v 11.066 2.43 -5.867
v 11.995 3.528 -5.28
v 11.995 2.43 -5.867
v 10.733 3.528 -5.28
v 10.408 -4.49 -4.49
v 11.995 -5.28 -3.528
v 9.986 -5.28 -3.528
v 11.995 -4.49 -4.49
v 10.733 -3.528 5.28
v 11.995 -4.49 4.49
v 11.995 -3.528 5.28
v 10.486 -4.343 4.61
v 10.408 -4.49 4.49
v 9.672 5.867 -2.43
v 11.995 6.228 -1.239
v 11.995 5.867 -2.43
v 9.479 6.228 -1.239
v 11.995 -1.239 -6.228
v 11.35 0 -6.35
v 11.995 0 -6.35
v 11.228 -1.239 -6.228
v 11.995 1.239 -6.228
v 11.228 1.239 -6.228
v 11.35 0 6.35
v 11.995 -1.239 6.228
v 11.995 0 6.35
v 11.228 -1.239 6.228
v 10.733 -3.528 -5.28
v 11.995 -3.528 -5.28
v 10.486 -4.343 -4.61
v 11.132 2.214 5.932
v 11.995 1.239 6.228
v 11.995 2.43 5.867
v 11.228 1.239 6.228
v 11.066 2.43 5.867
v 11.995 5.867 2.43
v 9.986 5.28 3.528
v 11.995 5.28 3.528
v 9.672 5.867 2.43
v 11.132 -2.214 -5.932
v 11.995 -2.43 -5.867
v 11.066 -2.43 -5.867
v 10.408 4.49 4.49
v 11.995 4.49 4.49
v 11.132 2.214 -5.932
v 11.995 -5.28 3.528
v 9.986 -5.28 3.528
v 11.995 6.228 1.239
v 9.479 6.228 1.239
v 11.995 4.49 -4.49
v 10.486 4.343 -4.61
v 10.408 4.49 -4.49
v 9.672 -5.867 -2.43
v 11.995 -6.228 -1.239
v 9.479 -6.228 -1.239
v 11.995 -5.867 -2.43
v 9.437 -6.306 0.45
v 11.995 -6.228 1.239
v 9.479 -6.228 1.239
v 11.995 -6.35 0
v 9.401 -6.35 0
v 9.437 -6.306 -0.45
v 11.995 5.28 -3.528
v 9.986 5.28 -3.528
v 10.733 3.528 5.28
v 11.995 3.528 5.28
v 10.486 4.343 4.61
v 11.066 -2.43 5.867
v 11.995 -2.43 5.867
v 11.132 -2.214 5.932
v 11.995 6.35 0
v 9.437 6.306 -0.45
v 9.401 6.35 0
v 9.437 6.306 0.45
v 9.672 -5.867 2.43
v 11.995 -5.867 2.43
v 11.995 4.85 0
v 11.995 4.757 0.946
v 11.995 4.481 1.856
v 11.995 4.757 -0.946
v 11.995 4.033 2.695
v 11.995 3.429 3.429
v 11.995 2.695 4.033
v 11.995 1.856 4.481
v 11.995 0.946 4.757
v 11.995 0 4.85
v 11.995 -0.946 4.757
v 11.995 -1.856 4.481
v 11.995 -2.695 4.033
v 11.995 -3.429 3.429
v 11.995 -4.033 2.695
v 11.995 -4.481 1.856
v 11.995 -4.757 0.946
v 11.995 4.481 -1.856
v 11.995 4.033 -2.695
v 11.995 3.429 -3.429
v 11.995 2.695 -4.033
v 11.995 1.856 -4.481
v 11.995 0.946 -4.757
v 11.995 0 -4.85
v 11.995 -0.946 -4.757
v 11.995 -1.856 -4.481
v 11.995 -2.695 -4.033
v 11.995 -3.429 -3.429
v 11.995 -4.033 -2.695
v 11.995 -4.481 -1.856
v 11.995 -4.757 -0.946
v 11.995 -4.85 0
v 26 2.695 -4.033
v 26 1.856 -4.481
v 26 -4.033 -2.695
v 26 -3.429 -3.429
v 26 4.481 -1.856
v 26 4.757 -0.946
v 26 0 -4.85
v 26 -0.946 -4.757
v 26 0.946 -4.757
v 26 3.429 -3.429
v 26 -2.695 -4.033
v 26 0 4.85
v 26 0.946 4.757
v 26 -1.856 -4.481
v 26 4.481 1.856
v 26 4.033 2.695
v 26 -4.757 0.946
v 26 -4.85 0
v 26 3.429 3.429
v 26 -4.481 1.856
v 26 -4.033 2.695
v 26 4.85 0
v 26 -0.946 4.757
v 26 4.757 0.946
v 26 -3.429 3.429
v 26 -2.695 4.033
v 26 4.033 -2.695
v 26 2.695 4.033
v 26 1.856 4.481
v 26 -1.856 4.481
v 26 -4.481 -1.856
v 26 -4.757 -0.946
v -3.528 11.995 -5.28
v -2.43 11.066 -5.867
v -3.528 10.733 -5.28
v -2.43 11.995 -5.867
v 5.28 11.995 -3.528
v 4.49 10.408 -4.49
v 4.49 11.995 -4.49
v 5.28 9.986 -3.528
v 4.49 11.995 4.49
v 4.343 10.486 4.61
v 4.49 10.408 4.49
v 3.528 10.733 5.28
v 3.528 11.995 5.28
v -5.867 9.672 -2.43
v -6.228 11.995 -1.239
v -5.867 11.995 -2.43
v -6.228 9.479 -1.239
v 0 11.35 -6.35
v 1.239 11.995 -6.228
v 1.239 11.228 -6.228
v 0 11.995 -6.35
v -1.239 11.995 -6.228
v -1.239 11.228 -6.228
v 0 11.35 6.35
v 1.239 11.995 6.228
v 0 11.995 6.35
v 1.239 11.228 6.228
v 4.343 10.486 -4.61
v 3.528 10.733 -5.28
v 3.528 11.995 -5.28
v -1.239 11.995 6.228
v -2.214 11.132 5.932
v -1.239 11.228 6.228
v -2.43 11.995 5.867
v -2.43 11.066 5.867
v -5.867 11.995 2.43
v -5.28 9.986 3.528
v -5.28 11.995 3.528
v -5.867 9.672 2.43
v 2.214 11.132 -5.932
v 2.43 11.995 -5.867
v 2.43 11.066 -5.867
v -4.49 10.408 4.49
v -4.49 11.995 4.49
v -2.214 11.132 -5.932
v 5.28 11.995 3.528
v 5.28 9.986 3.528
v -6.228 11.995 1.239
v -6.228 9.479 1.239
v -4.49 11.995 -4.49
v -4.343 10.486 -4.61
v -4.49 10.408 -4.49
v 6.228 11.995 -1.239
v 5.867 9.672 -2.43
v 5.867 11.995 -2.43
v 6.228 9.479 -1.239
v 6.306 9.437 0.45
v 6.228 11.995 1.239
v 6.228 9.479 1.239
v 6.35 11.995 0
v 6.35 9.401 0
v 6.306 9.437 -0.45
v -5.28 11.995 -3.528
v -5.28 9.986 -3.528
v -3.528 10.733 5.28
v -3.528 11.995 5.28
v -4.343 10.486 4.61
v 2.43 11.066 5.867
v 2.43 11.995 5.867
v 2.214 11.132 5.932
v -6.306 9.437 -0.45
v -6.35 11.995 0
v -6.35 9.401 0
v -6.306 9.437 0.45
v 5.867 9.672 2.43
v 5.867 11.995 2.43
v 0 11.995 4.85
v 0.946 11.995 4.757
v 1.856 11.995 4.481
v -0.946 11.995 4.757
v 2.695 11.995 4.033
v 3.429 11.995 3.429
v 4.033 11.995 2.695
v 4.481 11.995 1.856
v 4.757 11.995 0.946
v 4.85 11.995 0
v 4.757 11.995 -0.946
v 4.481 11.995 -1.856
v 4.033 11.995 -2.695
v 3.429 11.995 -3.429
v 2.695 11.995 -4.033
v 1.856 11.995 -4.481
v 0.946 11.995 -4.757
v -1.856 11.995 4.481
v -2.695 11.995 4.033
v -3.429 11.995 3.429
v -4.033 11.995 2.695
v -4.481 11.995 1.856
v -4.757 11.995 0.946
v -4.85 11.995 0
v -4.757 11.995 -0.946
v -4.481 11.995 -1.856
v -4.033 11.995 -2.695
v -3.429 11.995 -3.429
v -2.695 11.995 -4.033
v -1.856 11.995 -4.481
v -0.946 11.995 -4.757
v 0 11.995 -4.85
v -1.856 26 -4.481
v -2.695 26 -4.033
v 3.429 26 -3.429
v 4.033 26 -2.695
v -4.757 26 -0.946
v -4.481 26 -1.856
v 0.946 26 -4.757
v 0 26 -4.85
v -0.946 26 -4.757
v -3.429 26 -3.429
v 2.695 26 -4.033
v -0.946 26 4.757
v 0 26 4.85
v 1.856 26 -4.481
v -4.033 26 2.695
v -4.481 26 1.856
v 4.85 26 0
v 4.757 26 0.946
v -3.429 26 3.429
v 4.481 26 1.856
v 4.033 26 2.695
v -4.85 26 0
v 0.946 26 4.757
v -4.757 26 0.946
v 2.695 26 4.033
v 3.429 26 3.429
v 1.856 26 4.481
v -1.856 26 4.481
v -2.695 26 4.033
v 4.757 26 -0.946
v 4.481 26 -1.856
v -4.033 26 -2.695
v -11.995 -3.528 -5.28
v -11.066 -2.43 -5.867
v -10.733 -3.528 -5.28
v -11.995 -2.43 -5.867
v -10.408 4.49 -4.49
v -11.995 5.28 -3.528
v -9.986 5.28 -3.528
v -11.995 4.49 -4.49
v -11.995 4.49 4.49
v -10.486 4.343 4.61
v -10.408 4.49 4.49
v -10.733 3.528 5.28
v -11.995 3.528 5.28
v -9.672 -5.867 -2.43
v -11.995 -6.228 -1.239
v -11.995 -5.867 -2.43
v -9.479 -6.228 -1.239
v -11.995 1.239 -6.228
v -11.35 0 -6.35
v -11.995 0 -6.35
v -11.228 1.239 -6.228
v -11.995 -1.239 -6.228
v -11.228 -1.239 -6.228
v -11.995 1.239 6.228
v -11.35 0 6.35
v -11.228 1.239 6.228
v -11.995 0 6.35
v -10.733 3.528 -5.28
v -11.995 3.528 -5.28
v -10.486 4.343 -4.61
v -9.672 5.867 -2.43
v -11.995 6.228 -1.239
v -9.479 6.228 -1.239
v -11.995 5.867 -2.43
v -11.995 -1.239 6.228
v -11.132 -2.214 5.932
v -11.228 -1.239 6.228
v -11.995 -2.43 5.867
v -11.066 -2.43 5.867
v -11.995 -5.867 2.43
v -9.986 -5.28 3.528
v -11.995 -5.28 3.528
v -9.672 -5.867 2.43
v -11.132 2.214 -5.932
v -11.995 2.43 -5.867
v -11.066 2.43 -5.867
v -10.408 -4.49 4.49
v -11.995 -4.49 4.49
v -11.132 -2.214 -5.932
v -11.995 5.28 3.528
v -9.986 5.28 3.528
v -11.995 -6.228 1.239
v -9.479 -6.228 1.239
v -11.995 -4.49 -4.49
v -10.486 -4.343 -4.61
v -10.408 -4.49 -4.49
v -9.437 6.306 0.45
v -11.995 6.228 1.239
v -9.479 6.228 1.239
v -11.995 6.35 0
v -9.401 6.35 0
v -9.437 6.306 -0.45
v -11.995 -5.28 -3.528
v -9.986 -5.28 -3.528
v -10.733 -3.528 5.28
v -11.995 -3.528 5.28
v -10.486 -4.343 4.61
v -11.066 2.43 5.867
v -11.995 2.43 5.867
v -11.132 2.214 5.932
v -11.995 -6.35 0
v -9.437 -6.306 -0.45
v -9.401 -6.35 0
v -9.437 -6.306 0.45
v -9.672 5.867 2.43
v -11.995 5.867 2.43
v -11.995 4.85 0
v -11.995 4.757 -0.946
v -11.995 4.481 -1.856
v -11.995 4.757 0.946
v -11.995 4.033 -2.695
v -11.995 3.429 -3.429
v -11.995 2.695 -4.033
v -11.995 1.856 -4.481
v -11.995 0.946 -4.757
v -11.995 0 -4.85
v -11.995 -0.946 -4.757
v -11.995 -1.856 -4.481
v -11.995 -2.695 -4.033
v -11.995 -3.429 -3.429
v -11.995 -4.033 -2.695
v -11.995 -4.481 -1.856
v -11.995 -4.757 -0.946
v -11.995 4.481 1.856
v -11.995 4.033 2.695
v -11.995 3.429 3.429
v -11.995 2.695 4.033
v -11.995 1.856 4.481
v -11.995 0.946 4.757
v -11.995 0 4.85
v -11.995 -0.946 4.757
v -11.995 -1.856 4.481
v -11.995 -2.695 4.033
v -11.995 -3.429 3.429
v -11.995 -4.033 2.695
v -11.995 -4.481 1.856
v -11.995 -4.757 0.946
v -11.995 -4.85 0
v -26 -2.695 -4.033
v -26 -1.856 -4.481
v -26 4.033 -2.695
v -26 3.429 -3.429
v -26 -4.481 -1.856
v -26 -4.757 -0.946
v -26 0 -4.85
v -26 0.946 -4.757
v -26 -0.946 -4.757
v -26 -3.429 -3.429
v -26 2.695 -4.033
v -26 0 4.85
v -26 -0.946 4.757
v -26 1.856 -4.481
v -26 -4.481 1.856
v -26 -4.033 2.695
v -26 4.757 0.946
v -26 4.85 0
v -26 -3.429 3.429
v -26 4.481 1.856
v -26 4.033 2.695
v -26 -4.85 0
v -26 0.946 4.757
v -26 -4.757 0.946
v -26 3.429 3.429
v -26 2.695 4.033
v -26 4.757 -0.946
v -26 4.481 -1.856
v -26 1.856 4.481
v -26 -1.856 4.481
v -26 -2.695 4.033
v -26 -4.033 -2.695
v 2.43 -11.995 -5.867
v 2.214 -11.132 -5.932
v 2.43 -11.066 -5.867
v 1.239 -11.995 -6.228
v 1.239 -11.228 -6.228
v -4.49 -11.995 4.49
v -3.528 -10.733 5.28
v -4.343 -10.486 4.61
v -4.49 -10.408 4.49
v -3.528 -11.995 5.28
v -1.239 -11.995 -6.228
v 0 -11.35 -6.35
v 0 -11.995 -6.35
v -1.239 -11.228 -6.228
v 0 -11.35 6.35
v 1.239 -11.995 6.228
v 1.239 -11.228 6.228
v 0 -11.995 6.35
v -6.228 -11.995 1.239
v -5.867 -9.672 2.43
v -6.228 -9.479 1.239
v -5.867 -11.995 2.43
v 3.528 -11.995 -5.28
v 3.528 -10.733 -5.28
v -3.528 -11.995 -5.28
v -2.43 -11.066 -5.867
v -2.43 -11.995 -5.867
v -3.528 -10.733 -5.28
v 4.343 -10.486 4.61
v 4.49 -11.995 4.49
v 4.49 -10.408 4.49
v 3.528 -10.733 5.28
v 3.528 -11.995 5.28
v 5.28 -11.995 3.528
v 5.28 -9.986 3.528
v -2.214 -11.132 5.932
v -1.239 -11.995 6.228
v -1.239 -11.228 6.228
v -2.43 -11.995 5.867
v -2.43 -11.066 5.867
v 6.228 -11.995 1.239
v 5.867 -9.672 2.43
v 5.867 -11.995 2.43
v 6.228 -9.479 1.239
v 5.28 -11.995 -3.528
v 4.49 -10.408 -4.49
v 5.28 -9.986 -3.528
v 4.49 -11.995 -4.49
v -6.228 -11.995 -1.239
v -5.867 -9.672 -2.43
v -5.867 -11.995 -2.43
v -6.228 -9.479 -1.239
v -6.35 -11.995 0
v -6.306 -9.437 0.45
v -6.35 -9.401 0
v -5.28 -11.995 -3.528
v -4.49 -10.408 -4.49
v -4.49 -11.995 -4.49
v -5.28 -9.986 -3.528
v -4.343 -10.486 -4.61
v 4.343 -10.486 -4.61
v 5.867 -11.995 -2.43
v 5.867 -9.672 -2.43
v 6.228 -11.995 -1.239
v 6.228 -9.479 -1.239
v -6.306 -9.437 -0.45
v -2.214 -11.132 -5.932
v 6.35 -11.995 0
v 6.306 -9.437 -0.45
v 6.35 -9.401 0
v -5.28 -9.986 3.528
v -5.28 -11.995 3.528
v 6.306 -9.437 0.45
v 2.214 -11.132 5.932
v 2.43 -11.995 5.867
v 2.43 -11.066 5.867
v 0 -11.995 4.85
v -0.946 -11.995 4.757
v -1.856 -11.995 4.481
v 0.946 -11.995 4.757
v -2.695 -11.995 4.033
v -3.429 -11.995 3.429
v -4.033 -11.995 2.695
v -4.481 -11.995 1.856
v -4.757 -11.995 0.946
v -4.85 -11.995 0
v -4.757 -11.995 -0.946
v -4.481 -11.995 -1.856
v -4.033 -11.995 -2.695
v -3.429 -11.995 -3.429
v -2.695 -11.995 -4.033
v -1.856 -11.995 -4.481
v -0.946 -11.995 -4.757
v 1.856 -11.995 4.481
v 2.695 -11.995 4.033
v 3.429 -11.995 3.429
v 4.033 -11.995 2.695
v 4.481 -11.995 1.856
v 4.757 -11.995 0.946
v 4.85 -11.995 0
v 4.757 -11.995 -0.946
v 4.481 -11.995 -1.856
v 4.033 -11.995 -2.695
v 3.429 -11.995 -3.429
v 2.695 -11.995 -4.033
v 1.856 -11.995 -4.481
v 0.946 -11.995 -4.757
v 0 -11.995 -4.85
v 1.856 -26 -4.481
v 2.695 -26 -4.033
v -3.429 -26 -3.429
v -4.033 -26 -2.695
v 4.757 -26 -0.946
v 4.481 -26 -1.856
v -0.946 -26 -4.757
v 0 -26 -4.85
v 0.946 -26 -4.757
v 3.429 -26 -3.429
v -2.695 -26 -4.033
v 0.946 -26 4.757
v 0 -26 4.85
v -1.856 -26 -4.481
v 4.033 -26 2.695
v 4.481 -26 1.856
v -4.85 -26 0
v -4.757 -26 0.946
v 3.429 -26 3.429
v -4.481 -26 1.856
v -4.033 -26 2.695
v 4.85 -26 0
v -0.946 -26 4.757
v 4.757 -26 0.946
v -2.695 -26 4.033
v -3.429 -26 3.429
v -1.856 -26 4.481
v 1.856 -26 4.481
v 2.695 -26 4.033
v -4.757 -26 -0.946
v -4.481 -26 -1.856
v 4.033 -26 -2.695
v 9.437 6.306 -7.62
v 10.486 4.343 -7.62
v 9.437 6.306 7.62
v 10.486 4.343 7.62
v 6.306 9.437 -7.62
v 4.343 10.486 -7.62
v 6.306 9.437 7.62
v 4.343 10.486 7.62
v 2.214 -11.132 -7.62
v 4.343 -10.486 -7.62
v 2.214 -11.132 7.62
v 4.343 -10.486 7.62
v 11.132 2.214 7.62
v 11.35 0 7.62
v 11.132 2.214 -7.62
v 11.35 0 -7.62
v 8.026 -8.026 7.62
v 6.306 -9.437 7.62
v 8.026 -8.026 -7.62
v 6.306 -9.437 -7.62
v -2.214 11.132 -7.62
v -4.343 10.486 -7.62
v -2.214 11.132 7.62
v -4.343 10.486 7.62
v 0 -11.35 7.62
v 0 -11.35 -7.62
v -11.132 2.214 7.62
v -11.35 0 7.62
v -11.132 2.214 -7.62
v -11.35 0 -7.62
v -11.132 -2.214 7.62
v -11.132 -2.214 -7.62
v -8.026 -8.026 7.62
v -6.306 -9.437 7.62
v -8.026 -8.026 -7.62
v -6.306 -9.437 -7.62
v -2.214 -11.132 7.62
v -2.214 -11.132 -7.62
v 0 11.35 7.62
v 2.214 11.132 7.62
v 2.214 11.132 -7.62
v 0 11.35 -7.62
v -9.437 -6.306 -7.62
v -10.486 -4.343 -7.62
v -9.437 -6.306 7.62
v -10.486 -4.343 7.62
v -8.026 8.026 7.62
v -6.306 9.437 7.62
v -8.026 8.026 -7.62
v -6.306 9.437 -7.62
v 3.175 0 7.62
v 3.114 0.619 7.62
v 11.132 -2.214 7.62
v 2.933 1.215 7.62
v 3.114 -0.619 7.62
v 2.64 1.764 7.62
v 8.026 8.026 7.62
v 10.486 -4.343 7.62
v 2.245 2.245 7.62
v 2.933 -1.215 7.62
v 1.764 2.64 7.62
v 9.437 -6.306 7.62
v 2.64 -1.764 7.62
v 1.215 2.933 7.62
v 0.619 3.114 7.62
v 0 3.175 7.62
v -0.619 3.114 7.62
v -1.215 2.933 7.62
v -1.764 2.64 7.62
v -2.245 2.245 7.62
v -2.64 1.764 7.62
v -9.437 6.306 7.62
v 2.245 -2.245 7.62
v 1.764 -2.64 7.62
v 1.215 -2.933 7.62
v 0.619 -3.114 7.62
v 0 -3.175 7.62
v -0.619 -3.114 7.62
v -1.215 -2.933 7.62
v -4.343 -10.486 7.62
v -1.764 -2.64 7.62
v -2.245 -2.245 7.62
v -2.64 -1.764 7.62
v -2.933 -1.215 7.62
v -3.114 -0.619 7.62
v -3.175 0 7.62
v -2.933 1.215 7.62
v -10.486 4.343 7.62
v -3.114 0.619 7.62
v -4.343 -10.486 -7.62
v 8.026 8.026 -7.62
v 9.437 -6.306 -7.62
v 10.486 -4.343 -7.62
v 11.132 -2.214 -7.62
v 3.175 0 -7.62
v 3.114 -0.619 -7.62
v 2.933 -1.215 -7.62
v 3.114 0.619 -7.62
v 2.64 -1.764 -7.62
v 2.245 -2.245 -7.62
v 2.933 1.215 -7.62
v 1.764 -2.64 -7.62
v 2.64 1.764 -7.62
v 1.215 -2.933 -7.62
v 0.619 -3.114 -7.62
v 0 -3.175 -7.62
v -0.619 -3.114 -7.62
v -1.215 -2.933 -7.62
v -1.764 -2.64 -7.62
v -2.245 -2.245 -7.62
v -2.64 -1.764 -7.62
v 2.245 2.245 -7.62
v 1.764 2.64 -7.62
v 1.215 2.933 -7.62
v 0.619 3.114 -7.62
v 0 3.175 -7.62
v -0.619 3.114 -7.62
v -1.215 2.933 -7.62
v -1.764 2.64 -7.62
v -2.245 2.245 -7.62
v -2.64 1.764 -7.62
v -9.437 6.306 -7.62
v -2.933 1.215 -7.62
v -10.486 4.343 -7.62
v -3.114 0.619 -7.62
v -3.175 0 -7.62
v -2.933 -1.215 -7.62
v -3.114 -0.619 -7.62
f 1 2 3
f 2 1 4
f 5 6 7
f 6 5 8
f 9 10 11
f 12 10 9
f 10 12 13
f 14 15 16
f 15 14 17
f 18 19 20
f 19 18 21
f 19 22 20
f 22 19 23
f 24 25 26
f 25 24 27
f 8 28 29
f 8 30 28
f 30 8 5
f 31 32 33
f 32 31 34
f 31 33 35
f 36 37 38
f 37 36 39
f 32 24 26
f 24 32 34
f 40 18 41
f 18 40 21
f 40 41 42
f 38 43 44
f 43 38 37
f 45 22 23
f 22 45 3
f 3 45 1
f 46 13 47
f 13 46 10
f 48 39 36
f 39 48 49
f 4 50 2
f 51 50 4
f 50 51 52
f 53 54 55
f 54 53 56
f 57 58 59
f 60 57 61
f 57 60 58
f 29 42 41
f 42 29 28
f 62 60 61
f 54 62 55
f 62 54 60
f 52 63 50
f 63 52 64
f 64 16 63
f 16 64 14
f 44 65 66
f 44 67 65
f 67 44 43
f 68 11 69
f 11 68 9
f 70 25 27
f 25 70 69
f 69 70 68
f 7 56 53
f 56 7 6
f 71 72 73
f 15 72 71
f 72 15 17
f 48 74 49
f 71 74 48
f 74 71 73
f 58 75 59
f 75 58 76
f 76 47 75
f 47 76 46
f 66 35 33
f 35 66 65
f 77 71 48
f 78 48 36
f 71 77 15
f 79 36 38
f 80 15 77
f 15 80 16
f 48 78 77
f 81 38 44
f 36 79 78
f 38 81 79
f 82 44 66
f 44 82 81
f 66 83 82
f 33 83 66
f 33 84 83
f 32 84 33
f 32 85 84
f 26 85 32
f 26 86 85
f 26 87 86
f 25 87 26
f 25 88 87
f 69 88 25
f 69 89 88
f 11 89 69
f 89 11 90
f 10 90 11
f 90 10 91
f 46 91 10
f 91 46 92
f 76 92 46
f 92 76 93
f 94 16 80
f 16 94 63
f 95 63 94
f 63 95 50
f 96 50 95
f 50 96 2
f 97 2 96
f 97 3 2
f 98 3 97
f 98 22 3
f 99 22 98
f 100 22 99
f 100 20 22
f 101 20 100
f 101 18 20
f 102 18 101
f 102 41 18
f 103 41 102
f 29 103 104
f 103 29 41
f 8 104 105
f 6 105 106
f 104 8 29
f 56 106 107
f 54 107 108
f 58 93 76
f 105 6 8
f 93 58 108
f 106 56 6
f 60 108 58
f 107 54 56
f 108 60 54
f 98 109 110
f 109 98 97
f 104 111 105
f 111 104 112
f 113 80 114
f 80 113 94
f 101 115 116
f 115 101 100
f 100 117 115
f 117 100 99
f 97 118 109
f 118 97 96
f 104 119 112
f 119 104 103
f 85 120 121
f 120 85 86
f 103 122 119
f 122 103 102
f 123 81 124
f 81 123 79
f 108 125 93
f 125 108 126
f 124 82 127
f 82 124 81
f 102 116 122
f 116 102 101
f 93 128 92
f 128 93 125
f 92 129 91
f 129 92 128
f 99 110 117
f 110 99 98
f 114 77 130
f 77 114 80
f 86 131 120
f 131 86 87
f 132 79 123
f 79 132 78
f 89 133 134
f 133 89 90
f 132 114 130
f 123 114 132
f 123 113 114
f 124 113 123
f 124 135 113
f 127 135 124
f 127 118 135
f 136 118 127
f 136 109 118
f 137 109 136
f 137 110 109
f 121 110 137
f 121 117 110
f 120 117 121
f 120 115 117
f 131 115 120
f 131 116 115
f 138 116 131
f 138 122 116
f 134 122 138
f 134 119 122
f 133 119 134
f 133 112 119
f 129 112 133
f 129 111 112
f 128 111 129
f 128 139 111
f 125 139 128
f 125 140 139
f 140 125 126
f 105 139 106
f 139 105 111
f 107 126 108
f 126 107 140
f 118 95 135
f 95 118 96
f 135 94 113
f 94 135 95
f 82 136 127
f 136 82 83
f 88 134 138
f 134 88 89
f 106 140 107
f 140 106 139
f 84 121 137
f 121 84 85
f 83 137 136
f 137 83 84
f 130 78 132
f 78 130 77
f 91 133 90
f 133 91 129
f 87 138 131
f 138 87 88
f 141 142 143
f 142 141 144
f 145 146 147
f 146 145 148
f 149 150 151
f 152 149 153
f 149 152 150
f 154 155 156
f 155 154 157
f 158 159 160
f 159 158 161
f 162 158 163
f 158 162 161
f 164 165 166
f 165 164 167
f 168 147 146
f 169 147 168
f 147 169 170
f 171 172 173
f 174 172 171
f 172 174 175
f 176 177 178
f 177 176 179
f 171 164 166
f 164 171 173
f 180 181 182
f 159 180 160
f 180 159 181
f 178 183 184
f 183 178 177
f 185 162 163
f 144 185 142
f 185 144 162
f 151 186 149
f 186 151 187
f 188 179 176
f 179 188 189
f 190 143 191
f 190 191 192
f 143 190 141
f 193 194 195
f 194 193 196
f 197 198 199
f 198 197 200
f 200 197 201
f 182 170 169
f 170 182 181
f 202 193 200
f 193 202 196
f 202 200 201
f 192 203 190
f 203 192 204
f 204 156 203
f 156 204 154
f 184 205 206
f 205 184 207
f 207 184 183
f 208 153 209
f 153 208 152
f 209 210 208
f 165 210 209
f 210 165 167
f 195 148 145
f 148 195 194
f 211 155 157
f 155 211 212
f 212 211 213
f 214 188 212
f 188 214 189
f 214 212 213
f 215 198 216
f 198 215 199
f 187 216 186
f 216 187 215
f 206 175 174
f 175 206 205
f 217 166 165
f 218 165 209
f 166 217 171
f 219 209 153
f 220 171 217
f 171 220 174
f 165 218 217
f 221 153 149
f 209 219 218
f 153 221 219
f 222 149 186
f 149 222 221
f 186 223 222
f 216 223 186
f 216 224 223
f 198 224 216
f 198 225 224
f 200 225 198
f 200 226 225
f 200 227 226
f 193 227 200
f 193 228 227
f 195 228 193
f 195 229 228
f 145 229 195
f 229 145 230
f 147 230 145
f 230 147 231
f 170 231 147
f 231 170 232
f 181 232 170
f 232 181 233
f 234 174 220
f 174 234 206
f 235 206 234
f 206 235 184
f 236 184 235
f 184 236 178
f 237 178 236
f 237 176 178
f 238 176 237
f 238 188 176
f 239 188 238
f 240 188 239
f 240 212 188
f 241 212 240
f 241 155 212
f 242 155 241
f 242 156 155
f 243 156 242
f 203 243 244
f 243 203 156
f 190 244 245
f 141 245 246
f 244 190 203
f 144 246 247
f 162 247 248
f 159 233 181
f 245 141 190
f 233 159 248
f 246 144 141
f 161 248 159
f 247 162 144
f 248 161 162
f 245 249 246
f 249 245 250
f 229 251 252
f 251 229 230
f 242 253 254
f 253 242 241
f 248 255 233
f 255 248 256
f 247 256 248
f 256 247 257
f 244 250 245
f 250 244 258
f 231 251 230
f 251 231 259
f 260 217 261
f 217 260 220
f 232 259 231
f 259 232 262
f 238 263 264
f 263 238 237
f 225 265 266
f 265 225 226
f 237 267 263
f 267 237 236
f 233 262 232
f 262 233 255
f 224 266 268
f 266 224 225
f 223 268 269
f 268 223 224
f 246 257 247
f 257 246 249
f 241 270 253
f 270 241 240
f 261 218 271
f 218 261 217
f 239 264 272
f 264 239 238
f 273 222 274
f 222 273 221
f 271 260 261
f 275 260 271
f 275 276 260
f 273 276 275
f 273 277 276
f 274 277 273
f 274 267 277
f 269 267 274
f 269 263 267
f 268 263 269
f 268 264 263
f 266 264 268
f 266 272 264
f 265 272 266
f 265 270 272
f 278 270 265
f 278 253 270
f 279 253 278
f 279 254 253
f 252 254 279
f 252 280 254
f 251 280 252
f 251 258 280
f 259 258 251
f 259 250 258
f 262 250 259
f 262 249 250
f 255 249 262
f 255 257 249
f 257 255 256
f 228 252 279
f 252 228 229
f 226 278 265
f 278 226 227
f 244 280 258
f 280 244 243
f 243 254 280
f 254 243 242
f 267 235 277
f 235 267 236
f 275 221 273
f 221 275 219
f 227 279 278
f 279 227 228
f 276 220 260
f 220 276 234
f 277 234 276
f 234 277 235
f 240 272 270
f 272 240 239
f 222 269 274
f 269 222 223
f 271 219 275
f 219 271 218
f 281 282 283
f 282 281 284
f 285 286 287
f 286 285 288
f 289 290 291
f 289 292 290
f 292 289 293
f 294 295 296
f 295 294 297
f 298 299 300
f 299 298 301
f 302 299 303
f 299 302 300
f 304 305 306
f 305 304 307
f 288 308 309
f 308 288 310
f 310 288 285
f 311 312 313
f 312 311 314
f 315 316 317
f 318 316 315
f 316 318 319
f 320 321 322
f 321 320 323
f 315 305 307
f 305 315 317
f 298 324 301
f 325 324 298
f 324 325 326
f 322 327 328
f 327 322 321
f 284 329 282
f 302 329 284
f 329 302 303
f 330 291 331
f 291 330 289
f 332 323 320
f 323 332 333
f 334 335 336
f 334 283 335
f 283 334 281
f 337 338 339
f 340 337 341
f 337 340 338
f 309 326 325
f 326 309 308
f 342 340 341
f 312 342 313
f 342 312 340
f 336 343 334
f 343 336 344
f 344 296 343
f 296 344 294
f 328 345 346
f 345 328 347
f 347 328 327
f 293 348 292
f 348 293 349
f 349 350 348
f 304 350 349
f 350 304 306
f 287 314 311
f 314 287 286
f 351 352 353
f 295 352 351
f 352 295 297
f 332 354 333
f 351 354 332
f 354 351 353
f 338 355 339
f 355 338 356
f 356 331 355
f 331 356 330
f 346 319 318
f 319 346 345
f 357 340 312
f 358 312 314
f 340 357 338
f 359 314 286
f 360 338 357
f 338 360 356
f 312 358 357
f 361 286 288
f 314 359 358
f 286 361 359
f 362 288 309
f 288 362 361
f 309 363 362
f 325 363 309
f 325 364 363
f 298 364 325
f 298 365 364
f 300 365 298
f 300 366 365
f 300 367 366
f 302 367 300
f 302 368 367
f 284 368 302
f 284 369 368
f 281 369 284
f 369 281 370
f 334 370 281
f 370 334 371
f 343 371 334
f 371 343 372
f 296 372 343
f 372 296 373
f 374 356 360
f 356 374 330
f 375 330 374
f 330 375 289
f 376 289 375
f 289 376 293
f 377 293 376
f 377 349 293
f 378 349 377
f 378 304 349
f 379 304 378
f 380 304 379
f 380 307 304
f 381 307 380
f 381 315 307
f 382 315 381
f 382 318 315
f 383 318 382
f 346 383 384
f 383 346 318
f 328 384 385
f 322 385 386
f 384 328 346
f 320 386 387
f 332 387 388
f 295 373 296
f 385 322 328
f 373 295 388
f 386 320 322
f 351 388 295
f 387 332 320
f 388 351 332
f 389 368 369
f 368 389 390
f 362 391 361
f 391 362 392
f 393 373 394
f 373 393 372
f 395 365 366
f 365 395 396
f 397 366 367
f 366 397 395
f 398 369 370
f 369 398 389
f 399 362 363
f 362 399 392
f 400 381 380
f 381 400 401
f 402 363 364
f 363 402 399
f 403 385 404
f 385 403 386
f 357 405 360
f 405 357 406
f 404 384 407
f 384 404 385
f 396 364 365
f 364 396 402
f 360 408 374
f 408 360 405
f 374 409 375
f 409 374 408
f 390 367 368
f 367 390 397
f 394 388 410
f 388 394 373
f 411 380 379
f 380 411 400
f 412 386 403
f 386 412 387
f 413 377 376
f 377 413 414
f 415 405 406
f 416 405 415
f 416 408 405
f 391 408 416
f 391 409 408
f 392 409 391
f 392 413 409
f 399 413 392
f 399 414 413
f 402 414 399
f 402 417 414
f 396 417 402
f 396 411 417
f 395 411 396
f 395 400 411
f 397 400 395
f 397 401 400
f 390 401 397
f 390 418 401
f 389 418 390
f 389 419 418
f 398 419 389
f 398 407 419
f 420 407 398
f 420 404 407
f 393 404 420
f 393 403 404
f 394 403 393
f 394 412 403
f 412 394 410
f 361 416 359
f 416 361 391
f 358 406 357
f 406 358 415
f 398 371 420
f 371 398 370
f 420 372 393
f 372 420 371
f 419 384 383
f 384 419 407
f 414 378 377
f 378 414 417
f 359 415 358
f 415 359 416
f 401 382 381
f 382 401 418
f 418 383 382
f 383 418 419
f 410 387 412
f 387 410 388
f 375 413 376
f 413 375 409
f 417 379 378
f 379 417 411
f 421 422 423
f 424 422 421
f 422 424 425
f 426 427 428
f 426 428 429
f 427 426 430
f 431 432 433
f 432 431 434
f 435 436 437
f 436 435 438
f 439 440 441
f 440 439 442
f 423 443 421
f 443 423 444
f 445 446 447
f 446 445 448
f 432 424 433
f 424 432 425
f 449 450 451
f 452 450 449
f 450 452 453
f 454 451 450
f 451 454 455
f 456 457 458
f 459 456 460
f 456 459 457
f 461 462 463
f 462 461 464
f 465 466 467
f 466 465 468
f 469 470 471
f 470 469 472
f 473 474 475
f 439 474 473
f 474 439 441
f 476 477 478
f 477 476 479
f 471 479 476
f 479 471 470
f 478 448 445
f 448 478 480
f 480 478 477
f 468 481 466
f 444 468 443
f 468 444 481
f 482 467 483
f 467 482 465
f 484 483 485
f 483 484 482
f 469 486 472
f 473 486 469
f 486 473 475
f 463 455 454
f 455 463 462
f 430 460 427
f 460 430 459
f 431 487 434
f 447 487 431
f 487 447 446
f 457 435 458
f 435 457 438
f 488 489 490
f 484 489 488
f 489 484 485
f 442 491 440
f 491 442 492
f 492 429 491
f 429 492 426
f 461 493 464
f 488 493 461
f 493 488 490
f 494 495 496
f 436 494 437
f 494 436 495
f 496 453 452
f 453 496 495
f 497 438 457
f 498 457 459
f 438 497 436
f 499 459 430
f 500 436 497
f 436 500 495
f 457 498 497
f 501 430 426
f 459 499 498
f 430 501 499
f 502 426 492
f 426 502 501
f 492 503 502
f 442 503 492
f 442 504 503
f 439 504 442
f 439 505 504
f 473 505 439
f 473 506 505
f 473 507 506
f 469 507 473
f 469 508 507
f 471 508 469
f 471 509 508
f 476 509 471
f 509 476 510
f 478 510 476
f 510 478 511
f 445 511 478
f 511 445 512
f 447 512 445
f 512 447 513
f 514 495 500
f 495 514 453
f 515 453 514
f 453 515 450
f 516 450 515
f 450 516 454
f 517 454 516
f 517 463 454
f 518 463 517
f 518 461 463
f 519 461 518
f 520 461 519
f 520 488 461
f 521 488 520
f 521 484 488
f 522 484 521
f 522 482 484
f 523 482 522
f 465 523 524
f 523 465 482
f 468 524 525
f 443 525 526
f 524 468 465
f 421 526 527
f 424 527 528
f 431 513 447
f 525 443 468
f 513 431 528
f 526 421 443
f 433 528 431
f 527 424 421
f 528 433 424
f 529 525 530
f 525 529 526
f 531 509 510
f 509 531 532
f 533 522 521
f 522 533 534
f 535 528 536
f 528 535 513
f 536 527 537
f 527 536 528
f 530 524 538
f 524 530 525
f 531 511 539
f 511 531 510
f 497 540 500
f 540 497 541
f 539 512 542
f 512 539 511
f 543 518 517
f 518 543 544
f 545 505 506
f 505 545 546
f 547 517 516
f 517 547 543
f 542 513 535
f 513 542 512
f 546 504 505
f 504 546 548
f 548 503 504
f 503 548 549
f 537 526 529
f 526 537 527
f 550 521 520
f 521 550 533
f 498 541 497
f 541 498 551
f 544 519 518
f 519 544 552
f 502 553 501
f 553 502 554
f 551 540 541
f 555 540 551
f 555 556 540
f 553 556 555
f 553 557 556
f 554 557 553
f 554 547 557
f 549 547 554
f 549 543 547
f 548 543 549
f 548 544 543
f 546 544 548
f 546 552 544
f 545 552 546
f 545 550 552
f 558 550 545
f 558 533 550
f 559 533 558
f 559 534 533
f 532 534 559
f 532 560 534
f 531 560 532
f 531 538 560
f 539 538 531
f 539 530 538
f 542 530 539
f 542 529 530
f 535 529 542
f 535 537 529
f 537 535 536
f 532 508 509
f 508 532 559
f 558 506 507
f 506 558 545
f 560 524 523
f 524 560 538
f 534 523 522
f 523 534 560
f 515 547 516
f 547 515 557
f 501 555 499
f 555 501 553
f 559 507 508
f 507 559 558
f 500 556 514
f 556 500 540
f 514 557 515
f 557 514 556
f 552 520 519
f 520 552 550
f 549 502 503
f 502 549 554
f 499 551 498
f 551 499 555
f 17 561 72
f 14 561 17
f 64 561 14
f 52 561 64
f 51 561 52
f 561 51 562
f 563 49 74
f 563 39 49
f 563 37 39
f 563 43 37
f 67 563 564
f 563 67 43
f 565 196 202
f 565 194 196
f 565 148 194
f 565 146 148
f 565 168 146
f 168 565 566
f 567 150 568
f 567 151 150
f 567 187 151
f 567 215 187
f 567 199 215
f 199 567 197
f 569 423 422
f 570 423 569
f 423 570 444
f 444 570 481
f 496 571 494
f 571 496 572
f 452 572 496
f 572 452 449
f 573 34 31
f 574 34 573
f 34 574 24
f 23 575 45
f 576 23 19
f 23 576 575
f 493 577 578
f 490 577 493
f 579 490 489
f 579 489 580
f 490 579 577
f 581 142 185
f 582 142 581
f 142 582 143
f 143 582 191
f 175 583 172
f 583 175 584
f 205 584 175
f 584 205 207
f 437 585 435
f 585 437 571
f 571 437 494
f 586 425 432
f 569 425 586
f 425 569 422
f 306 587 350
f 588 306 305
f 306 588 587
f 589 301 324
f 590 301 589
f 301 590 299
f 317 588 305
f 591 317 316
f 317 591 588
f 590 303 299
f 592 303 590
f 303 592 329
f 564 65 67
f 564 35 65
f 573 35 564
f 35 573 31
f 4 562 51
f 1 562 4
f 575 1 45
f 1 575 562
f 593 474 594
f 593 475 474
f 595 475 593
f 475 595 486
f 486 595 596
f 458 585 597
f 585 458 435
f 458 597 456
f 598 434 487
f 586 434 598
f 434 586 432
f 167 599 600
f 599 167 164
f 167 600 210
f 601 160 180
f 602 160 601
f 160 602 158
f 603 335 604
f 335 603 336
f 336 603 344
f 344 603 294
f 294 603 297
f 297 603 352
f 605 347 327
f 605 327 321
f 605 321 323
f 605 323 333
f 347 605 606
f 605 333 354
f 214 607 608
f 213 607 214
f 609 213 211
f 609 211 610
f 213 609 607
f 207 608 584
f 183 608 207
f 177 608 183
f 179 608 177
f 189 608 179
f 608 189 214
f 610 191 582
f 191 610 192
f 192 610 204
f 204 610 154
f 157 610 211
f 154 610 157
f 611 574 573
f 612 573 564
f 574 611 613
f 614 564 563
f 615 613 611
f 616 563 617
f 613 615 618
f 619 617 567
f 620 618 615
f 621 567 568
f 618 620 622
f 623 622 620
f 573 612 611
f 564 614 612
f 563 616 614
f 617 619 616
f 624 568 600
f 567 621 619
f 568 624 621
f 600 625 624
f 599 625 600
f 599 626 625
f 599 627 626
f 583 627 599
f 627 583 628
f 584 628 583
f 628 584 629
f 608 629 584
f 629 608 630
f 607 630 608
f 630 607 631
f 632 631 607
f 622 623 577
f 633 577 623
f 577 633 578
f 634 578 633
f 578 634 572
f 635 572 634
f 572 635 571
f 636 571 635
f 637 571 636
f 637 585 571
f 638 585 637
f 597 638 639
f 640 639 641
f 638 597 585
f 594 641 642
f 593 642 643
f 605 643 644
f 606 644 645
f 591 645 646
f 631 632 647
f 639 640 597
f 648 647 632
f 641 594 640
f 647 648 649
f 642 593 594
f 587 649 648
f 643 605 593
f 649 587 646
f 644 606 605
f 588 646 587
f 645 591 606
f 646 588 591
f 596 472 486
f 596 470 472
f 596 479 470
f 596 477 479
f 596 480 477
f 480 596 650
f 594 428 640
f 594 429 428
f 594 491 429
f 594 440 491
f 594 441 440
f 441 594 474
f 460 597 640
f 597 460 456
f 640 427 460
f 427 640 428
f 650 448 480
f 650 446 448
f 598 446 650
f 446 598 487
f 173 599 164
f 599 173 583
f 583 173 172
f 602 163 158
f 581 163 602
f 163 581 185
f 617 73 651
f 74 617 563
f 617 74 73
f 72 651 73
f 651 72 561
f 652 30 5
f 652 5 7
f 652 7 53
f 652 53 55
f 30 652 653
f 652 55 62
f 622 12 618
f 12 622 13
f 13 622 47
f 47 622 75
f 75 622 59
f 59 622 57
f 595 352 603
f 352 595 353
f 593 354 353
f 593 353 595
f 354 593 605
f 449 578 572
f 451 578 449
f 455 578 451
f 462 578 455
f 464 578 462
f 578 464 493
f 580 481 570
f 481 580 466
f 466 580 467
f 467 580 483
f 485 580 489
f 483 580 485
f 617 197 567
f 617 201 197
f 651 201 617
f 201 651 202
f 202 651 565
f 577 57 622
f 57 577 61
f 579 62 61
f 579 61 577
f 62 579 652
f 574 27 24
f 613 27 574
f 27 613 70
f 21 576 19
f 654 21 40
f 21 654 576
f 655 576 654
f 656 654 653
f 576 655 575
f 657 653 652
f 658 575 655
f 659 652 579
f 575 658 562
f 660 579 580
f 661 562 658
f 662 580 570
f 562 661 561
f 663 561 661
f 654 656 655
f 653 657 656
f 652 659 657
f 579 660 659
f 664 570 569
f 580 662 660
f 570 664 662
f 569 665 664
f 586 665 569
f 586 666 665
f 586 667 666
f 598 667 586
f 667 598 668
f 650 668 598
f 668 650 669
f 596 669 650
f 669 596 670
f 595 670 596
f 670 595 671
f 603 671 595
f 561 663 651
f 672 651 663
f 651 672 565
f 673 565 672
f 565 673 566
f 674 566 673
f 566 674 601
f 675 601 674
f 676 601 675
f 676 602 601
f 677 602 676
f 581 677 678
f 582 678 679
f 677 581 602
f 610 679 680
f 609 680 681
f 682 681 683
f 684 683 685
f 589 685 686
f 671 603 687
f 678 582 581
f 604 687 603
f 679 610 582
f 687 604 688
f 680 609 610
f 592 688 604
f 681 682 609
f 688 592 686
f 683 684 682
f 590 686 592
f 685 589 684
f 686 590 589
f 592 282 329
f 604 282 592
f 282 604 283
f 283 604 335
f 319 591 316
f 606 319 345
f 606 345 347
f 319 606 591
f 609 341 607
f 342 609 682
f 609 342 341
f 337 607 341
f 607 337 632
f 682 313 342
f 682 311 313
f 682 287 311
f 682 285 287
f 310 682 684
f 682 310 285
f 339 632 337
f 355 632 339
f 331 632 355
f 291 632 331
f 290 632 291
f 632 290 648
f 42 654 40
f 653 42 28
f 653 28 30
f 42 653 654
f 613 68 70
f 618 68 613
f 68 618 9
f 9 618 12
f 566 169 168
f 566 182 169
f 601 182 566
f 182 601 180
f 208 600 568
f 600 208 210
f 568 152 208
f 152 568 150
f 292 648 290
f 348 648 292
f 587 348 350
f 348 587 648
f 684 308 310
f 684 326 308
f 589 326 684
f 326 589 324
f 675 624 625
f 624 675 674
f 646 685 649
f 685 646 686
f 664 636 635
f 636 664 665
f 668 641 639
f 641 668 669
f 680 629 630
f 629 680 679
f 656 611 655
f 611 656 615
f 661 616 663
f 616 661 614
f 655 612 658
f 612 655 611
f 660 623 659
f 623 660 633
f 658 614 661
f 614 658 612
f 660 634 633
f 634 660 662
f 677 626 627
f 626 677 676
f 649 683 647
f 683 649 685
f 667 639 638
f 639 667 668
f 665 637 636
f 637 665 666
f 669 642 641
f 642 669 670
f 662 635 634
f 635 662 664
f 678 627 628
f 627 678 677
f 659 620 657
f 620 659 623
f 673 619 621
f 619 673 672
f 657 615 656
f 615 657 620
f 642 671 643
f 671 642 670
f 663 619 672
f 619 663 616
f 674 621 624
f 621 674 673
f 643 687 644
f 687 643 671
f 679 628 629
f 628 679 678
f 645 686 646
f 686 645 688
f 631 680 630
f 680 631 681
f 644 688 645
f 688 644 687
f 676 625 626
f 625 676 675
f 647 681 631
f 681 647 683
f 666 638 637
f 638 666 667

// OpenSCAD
$fn = 32;

// ----------------------------------------------------------------------
// Cardan cross: 52 mm span, 12.7 mm trunnions
// ----------------------------------------------------------------------

// --- parameters (mm) ---
journal_d = 12.7;         // trunnion diameter
arm_len = 26;             // trunnion length from the centre
step_r = 4.32;            // step position from the centre
step_d = 9.7;             // journal diameter after the step
hub_d = 22.7;             // hub diameter
hub_h = 15.24;            // hub height
bore_d = 6.35;            // hub bore

difference() {
  union() {
    /* hub along the joint axis */
    cylinder(h = hub_h, d = hub_d, center = true);
    for (a = [0 : 90 : 270]) rotate([0, 0, a]) {
      /* trunnion, sunk into the hub */
      translate([hub_d / 4, 0, 0]) rotate([0, 90, 0]) cylinder(h = step_r + 2, d = journal_d);
      /* stepped journal out to the tip */
      translate([step_r - 0.5, 0, 0]) rotate([0, 90, 0]) cylinder(h = arm_len + 0.5 - step_r, d = step_d);
    }
  }
  /* lubrication bore through the hub, 2.5 mm clear on both sides */
  translate([0, 0, -hub_h / 2 - 2.5]) cylinder(h = hub_h + 5, d = bore_d);
}
